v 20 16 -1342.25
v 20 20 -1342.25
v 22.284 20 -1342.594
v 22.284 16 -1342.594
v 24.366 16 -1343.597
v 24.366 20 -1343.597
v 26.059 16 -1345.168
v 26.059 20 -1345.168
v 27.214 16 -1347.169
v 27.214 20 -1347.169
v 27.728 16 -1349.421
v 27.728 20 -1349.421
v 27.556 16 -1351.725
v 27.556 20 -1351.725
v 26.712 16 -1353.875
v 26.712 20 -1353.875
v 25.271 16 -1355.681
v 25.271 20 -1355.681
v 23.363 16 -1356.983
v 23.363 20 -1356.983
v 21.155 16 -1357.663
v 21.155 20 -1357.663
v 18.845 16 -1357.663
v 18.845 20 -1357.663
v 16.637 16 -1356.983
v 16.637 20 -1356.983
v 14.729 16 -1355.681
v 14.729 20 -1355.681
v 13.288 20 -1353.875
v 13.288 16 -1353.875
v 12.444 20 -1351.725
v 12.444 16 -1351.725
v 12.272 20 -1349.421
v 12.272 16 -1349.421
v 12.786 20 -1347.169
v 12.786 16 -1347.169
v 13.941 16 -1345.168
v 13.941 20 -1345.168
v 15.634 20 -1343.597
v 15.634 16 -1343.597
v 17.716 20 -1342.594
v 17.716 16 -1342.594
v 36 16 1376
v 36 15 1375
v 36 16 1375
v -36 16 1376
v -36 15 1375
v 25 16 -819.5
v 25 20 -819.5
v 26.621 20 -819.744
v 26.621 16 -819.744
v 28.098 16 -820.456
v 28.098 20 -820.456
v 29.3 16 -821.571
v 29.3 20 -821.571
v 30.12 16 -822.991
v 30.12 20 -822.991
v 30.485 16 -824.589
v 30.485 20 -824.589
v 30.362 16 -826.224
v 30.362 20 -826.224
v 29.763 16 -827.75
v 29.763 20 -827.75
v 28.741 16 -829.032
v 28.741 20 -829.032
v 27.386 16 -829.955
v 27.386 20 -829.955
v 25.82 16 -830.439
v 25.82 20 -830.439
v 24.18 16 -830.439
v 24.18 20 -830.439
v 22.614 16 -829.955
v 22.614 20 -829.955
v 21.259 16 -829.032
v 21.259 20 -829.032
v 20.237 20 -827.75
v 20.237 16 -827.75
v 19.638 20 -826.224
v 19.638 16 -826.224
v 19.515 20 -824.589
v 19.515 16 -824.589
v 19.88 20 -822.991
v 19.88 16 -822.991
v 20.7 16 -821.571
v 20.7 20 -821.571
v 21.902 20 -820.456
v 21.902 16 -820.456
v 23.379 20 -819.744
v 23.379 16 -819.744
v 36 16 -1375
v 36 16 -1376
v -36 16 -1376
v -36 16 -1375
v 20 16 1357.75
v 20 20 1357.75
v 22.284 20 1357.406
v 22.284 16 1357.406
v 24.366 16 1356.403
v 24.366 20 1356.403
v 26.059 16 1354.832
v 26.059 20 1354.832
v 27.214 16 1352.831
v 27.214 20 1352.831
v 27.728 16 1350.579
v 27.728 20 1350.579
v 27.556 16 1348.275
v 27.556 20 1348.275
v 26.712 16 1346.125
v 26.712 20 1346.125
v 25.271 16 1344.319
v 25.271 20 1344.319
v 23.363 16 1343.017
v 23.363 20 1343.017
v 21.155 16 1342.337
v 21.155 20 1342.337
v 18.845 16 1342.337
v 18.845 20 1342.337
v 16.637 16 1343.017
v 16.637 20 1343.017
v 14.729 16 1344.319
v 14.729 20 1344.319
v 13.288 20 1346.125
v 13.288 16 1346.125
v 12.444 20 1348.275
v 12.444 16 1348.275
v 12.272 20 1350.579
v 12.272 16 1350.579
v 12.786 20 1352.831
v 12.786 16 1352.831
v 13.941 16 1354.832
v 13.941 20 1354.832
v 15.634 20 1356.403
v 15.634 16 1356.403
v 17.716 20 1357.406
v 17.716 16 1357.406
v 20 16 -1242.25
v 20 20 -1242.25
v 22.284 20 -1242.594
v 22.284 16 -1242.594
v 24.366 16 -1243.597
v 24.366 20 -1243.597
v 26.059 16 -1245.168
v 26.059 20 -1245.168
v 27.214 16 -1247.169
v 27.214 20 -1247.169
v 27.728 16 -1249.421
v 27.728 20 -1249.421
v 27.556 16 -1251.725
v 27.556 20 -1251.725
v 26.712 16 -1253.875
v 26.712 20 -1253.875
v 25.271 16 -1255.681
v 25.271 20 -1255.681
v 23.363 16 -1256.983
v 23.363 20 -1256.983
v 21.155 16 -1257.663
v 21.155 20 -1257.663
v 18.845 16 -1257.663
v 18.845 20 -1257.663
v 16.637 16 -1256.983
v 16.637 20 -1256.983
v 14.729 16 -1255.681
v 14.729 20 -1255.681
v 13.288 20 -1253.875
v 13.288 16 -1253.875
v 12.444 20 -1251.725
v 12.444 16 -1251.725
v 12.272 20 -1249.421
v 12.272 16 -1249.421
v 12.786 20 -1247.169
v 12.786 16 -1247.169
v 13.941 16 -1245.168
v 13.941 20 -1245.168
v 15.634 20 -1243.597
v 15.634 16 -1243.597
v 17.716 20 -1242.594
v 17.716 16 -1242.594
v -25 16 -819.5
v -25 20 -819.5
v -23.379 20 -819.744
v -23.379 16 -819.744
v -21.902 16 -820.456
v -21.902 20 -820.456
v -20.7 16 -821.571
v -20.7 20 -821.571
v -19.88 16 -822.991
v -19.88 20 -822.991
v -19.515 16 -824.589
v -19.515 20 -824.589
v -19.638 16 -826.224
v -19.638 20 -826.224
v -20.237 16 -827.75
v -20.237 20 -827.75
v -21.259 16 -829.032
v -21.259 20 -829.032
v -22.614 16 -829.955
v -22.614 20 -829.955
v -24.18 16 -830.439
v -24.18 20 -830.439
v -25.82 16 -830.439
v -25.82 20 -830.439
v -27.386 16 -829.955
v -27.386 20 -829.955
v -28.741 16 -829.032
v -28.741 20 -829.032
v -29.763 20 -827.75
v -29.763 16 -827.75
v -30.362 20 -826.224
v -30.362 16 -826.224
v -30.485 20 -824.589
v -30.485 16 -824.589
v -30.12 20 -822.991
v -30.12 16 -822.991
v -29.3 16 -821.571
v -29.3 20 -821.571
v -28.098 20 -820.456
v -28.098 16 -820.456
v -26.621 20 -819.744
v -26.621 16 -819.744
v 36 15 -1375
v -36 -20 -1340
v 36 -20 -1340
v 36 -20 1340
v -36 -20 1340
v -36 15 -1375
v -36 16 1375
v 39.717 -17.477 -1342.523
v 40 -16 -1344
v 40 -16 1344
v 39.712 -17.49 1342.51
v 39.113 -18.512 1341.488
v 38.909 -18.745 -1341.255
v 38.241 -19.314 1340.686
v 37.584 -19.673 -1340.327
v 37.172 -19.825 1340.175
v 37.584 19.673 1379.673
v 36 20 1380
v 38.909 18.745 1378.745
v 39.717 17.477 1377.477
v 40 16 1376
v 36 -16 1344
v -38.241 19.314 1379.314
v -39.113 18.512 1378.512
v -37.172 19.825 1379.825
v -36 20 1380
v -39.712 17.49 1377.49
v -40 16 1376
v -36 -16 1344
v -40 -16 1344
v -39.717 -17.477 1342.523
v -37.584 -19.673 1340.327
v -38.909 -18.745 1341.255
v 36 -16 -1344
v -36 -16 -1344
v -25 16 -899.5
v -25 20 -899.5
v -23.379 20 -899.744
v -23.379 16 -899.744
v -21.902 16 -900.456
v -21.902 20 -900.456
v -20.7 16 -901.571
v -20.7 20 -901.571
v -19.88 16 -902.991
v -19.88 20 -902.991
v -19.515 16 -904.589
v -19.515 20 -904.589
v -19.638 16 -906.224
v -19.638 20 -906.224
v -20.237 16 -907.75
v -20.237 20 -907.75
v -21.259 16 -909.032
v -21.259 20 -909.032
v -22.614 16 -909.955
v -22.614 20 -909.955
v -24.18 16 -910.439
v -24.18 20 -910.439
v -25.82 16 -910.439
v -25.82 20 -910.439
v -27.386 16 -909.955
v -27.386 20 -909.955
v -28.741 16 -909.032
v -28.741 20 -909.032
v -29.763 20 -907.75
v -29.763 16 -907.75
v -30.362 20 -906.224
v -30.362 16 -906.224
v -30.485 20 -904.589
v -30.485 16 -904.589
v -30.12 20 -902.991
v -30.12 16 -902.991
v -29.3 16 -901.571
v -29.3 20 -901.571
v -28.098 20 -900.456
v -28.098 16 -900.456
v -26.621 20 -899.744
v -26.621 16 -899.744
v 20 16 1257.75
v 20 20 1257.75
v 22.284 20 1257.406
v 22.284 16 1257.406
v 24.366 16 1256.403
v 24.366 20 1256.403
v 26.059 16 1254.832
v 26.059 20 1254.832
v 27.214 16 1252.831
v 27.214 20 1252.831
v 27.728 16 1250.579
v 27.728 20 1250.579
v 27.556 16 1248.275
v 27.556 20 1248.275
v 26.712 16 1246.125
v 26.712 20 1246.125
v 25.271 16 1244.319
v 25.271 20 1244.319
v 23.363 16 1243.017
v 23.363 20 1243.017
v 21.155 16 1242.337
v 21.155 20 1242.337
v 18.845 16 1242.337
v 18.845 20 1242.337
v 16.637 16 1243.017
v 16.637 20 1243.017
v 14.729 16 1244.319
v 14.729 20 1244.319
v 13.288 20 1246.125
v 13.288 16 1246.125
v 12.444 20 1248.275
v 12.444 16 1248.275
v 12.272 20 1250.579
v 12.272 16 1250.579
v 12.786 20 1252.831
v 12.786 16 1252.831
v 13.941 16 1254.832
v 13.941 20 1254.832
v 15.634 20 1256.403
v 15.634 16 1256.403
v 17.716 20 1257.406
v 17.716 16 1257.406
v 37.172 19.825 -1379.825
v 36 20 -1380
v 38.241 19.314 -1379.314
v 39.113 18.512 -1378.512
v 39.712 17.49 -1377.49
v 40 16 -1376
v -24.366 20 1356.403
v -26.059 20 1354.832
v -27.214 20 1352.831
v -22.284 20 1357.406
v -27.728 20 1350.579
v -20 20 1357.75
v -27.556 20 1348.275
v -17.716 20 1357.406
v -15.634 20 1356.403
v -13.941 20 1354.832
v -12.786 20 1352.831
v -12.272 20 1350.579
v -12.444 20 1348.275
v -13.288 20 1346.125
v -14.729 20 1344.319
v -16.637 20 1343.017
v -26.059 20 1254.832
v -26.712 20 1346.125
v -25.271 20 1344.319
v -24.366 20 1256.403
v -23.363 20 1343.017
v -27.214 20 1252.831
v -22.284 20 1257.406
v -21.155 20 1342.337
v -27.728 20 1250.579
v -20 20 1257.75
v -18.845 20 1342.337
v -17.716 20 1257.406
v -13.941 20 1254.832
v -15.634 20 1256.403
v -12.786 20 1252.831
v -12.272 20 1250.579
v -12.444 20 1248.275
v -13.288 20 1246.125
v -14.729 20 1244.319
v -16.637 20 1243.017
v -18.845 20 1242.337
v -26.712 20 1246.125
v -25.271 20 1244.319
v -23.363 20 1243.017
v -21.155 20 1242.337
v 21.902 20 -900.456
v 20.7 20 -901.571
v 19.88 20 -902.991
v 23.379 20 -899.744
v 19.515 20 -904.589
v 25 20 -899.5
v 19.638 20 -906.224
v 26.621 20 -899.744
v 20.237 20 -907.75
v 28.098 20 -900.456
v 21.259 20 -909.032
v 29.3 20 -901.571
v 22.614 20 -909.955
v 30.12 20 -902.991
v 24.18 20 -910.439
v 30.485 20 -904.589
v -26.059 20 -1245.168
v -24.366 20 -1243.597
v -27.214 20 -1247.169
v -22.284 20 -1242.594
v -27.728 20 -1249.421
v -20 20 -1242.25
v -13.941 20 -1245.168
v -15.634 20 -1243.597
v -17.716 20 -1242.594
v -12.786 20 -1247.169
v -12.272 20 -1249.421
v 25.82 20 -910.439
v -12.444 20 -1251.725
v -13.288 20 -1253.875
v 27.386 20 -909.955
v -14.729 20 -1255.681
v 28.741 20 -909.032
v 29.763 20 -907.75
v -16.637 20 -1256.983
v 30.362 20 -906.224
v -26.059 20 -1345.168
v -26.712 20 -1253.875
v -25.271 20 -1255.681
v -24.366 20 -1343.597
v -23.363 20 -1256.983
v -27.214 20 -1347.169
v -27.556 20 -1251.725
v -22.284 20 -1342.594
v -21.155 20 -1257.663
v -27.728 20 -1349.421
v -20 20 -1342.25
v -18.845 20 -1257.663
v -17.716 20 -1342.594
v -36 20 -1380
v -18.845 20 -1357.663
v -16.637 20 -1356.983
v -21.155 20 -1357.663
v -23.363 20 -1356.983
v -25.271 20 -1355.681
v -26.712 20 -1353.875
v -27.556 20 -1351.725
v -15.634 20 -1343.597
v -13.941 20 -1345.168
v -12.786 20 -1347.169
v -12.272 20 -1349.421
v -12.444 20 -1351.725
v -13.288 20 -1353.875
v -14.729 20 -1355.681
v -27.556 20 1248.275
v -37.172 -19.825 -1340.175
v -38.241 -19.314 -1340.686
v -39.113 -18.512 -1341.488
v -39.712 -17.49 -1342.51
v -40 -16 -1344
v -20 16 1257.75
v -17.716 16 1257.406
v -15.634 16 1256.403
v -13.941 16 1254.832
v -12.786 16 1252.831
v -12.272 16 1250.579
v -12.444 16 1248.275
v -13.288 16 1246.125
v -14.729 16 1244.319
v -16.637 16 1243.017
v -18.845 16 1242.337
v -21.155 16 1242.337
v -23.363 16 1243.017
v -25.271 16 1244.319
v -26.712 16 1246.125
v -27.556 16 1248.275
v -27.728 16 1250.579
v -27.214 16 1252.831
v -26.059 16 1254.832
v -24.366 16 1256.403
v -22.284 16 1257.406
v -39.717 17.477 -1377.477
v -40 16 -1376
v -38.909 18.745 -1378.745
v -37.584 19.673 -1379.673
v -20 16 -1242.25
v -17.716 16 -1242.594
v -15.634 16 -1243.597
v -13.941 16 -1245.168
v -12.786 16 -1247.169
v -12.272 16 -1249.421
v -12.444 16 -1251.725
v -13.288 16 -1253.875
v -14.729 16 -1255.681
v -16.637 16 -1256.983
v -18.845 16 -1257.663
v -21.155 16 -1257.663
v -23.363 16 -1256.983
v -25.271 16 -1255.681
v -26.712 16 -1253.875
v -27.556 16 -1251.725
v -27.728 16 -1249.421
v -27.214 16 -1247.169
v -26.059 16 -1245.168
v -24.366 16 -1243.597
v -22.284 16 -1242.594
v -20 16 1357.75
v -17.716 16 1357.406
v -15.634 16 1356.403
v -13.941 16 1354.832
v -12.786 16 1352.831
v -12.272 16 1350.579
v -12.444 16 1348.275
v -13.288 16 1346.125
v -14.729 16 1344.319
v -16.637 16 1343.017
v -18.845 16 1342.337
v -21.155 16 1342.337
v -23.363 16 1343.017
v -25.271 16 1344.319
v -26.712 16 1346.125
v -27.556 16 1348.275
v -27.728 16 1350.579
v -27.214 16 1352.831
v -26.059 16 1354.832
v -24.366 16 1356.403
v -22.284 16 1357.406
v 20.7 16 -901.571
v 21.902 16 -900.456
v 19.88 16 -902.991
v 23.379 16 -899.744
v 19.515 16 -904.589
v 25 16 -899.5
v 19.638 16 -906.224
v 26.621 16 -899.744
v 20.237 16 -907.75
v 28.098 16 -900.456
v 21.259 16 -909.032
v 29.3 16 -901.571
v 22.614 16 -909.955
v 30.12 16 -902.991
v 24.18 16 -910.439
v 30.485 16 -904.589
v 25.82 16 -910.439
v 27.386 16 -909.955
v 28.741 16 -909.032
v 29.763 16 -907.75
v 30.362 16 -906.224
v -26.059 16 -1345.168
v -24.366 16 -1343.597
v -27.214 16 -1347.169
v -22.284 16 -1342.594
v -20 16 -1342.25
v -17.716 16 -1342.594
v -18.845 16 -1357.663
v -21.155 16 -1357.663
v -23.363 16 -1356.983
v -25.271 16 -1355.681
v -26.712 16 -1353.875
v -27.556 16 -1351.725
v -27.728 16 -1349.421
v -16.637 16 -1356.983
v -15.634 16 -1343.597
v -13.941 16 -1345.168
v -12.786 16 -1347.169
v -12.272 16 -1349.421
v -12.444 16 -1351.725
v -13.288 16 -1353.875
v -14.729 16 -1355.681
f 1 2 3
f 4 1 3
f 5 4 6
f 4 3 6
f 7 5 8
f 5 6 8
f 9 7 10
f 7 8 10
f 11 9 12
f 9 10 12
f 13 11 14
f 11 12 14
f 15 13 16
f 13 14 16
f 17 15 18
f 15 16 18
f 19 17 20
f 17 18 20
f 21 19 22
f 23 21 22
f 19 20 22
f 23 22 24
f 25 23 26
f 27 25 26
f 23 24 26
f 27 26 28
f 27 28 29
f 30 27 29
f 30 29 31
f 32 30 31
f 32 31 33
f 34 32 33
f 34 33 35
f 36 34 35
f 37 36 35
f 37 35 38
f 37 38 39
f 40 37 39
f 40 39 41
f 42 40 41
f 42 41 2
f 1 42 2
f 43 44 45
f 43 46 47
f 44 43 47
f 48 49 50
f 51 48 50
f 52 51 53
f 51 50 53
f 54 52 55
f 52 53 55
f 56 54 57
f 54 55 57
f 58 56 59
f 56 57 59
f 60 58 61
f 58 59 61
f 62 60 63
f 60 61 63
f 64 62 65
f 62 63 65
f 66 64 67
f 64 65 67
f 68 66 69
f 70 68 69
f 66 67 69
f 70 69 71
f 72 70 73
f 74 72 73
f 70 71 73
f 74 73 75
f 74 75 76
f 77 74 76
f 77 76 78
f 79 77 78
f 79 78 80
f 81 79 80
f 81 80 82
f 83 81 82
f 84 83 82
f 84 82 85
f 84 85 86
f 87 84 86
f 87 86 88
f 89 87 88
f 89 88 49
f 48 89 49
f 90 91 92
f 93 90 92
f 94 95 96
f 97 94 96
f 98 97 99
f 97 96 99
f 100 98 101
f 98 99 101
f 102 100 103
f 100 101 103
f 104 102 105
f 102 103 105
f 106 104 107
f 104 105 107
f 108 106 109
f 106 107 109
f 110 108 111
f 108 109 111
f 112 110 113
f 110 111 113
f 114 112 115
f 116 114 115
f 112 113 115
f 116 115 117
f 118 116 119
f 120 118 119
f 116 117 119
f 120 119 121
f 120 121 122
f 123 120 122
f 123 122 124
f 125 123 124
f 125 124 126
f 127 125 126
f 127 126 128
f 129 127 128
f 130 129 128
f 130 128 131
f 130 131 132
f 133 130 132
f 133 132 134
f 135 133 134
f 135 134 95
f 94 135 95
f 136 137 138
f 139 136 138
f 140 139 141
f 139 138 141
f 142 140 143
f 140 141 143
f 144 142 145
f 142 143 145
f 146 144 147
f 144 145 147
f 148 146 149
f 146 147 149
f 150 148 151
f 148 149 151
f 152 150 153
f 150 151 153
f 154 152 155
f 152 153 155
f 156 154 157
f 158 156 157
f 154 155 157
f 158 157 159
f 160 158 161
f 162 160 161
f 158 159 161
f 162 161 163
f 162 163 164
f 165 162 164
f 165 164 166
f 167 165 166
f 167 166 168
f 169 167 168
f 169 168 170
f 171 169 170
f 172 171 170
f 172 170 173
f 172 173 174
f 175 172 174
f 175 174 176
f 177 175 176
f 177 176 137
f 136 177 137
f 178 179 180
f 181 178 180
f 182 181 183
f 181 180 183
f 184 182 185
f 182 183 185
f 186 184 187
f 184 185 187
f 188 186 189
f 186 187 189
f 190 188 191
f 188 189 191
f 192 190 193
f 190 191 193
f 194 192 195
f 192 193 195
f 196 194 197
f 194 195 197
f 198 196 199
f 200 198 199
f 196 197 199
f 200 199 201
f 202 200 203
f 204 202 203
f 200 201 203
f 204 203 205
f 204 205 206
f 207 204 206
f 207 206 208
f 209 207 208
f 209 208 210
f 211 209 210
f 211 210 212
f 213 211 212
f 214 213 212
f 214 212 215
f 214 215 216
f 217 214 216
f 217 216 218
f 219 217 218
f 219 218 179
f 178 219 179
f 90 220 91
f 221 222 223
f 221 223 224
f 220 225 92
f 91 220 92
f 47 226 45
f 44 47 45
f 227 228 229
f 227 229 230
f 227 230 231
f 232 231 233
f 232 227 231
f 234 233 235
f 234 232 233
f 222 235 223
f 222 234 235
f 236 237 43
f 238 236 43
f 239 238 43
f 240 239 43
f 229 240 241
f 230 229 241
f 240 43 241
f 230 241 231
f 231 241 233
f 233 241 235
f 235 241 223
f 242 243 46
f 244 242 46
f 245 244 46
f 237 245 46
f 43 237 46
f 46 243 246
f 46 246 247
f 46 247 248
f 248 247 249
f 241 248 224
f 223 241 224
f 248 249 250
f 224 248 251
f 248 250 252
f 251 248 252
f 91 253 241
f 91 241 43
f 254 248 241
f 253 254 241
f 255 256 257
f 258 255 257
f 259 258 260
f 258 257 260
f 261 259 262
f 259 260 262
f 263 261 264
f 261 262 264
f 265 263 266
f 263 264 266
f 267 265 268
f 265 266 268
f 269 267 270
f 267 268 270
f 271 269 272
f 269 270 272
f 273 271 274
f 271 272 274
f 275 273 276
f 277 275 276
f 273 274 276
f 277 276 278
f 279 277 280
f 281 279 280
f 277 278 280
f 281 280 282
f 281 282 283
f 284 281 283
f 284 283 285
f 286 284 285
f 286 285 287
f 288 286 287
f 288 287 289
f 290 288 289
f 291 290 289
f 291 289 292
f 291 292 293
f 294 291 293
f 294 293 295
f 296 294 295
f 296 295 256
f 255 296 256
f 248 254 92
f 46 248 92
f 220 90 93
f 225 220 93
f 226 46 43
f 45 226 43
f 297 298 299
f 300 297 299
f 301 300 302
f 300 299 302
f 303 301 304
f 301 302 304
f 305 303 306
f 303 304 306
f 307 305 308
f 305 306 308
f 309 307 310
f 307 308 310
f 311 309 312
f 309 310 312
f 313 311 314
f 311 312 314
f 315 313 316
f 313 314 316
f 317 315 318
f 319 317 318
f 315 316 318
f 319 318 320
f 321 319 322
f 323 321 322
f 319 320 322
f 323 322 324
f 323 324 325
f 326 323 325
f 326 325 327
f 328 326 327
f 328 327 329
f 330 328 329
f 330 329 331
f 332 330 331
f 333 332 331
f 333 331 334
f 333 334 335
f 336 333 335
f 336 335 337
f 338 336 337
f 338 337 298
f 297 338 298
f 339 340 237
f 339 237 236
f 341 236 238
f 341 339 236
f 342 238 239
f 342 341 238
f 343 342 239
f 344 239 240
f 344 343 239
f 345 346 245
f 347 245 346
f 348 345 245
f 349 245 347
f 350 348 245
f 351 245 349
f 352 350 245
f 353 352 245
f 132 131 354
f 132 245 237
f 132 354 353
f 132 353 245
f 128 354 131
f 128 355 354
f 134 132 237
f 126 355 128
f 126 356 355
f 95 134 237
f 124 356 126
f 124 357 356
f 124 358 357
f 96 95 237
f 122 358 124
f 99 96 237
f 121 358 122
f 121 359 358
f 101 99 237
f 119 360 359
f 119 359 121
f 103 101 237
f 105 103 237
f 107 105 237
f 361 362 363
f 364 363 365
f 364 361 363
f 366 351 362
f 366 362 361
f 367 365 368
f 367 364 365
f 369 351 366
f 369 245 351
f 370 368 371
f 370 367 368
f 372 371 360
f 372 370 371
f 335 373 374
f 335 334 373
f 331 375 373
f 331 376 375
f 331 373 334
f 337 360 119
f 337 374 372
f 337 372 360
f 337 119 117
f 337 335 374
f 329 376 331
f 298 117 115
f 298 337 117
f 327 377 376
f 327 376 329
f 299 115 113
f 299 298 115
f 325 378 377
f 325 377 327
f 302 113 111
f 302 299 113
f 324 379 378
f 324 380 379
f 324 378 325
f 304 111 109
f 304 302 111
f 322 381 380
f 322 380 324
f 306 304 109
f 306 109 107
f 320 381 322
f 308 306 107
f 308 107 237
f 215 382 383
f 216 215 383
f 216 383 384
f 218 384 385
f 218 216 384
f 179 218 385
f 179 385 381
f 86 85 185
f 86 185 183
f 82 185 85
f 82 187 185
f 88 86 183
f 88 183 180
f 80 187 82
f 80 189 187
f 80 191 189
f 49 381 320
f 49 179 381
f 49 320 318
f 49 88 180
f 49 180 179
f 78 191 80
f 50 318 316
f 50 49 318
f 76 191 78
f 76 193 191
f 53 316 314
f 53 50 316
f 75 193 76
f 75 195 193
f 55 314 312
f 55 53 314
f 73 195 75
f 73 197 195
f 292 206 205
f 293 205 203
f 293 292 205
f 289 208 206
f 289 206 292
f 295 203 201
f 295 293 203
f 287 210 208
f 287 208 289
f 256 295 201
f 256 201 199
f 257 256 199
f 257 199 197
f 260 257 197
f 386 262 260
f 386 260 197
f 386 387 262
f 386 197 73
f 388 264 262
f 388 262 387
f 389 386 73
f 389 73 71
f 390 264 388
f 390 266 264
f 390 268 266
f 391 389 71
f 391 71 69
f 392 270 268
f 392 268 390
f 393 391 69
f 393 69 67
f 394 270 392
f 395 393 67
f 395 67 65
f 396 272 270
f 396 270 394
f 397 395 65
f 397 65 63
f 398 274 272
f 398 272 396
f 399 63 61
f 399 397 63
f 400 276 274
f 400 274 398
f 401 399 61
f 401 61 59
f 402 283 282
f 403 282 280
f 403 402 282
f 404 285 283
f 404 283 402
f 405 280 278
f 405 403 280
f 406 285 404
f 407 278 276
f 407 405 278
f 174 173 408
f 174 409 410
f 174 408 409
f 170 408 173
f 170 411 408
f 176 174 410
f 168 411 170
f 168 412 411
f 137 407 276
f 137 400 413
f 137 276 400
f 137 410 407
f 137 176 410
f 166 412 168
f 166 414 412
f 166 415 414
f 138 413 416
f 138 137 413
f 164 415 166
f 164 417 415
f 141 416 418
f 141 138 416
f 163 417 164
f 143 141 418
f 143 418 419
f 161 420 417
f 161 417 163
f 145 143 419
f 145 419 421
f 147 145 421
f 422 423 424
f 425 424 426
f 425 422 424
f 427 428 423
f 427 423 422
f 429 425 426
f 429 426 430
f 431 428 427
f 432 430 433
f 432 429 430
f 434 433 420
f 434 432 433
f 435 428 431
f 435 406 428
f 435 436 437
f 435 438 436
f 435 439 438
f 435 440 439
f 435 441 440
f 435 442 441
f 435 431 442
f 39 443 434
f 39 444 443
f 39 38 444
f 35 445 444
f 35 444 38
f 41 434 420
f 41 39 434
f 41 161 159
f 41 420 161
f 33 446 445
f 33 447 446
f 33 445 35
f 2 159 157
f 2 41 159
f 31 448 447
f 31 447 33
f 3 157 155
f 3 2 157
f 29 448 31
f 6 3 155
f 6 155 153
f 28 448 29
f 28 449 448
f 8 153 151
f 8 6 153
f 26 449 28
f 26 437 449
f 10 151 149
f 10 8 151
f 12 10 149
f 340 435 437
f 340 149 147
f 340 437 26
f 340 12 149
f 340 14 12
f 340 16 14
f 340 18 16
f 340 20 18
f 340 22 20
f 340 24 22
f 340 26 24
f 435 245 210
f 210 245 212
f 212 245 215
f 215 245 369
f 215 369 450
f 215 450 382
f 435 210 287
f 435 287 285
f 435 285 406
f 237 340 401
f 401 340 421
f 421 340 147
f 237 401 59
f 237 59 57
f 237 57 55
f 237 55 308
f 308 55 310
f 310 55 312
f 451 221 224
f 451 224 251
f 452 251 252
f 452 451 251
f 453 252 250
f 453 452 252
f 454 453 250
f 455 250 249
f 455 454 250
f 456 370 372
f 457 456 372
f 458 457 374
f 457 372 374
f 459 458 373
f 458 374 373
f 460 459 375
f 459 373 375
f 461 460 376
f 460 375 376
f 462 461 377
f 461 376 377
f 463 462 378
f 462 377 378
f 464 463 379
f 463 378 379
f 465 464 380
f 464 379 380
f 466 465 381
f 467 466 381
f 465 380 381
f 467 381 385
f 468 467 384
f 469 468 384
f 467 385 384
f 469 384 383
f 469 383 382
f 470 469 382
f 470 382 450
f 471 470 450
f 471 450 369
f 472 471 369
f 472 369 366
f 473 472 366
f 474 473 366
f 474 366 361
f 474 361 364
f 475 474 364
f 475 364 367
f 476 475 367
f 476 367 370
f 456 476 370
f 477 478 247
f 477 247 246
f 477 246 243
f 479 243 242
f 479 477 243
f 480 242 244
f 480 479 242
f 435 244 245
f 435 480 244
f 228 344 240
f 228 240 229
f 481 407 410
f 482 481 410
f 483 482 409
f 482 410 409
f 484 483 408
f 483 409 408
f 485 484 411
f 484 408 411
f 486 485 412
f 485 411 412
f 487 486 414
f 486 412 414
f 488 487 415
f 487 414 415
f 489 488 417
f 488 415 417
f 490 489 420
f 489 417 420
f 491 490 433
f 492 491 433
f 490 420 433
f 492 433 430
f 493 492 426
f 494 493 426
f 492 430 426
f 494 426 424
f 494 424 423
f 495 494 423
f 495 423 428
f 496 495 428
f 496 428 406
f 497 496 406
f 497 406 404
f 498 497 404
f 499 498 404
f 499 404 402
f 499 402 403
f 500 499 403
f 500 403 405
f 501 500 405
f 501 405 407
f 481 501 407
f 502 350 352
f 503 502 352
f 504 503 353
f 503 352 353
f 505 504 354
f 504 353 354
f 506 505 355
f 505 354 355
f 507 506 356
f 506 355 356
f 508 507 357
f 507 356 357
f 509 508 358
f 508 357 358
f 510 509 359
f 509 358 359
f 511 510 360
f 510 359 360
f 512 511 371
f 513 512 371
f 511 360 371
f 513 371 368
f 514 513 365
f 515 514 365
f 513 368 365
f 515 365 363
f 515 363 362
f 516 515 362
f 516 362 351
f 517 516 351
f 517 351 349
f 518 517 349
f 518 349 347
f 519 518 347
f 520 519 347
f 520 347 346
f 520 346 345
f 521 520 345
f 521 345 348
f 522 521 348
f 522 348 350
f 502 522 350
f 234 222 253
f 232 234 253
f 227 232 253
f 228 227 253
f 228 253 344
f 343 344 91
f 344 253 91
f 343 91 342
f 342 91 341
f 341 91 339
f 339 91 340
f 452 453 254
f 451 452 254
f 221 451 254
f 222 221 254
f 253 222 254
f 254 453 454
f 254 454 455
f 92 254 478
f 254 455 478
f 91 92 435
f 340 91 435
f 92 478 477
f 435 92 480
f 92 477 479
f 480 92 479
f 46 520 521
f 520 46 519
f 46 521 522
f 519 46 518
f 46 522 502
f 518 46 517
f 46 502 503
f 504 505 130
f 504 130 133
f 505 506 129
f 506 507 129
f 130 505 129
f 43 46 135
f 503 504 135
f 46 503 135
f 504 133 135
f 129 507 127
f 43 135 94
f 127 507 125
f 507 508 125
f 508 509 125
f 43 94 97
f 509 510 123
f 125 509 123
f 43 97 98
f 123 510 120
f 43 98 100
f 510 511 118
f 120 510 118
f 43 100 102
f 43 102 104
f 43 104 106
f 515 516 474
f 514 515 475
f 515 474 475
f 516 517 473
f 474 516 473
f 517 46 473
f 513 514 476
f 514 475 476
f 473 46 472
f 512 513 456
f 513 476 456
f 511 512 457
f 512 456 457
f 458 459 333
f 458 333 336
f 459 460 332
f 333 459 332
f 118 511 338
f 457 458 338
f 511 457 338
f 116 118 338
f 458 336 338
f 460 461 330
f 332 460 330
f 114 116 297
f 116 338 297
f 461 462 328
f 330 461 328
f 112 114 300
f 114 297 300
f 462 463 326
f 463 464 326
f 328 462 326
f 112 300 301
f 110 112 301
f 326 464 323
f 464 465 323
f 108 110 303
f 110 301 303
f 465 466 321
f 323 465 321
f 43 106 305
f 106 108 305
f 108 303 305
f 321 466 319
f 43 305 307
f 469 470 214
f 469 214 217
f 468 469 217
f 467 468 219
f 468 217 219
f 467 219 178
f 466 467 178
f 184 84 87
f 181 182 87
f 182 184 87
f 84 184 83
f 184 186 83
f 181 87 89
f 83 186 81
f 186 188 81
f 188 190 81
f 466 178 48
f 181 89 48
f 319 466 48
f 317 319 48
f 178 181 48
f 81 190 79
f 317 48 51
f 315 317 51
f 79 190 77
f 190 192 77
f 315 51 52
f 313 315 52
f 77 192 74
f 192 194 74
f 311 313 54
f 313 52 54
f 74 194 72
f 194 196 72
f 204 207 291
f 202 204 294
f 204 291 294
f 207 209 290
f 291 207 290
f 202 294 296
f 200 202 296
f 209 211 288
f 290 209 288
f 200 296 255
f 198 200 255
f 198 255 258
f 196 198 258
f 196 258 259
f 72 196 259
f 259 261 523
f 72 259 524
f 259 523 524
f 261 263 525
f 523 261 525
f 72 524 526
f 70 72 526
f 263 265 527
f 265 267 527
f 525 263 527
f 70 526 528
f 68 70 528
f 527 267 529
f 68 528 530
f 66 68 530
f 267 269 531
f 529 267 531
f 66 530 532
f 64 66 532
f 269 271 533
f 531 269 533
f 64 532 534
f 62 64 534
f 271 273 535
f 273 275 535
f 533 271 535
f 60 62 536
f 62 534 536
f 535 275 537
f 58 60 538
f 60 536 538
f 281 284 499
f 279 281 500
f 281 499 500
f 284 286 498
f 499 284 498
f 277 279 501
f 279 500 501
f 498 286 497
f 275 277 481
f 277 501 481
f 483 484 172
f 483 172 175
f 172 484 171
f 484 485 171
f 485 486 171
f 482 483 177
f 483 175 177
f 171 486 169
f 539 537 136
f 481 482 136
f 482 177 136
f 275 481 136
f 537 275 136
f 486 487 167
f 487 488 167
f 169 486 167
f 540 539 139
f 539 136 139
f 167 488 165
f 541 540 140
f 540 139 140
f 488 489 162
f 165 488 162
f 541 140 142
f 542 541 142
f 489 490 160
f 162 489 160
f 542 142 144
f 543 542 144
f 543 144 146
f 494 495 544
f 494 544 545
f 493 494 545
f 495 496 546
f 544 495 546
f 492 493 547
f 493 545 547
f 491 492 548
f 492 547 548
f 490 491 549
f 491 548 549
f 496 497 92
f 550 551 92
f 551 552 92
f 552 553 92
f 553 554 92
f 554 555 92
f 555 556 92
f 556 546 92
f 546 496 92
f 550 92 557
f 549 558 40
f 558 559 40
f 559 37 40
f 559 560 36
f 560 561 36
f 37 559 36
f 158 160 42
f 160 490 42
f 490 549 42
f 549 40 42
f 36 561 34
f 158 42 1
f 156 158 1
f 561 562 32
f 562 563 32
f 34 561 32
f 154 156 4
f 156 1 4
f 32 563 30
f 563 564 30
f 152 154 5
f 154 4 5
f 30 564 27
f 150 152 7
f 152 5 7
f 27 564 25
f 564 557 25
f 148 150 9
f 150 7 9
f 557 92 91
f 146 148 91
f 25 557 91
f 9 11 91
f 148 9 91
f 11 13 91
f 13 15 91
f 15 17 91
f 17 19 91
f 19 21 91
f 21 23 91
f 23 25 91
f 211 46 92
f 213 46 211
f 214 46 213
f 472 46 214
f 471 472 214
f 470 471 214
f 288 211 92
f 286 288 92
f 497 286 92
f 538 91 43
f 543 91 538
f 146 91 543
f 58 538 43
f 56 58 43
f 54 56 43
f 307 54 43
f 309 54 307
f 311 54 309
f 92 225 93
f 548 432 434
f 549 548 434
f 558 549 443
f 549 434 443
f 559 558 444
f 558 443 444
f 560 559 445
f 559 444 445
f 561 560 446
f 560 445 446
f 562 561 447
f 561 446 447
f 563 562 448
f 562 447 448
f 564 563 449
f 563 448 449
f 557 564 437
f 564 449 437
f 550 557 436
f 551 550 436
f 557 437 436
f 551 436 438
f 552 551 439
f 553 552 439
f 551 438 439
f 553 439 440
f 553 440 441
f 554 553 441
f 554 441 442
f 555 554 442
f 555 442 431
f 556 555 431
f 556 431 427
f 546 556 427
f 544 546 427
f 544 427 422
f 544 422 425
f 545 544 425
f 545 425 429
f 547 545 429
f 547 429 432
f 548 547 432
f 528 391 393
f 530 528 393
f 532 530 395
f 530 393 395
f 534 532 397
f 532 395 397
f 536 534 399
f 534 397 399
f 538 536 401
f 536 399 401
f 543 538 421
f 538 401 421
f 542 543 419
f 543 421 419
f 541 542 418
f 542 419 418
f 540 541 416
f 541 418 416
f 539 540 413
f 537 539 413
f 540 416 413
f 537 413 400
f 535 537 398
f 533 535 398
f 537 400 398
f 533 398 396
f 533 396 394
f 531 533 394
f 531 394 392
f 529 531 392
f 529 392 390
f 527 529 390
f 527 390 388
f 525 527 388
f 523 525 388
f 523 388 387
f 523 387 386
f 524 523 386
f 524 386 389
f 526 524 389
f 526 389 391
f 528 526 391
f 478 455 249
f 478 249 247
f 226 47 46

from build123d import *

# Parameters (mm, degrees)
Y_KSEKLIK_EKSTR_ZYON1_DEPTH      = 1380
Y_KSEKLIK_EKSTR_ZYON1_DEPTH_BACK = 1380
IZIM1_W                          = 72
IZIM1_H                          = 32
IZIM2_R                          = 7.75
KES_EKSTR_ZYON1_DEPTH            = 10
IZIM3_R                          = 5.5
KES_EKSTR_ZYON2_DEPTH            = 20
IZIM4_W                          = 72
IZIM4_H                          = 32
Y_KSEKLIK_EKSTR_ZYON2_DEPTH      = 5
IZIM5_W                          = 72
IZIM5_H                          = 32
Y_KSEKLIK_EKSTR_ZYON3_DEPTH      = 5
KES_EKSTR_ZYON3_DEPTH            = 220
KES_EKSTR_ZYON3_DEPTH_BACK       = 290


with BuildPart() as part:
    # Çizim1 → Yükseklik-Ekstrüzyon1 (new, two sides: drawn at the far end of the back side and taken through both)
    with BuildSketch(Plane.XY.offset(-Y_KSEKLIK_EKSTR_ZYON1_DEPTH_BACK)):
        with BuildLine():
            Line((-36, 20), (36, 20))
            ThreePointArc((36, 20), (38.828427125, 18.828427125), (40, 16))
            Line((40, 16), (40, -16))
            ThreePointArc((40, -16), (38.828427125, -18.828427125), (36, -20))
            Line((36, -20), (-36, -20))
            ThreePointArc((-36, -20), (-38.828427125, -18.828427125), (-40, -16))
            Line((-40, -16), (-40, 16))
            ThreePointArc((-40, 16), (-38.828427125, 18.828427125), (-36, 20))
        make_face()
        Rectangle(IZIM1_W, IZIM1_H, mode=Mode.SUBTRACT)
    extrude(amount=Y_KSEKLIK_EKSTR_ZYON1_DEPTH + Y_KSEKLIK_EKSTR_ZYON1_DEPTH_BACK)

    # Çizim2 → Kes-Ekstrüzyon1 (cut)
    with BuildSketch(Plane(origin=(0, 20, 0), x_dir=(1, 0, 0), z_dir=(0, 1, 0))):
        with Locations(Location((-20, 1350, 0), (0, 0, 270))):
            Circle(IZIM2_R)
        with Locations(Location((20, 1350, 0), (0, 0, 270))):
            Circle(IZIM2_R)
        with Locations(Location((20, 1250, 0), (0, 0, 270))):
            Circle(IZIM2_R)
        with Locations(Location((-20, 1250, 0), (0, 0, 270))):
            Circle(IZIM2_R)
        with Locations(Location((-20, -1250, 0), (0, 0, 270))):
            Circle(IZIM2_R)
        with Locations(Location((20, -1250, 0), (0, 0, 270))):
            Circle(IZIM2_R)
        with Locations(Location((20, -1350, 0), (0, 0, 270))):
            Circle(IZIM2_R)
        with Locations(Location((-20, -1350, 0), (0, 0, 270))):
            Circle(IZIM2_R)
    extrude(amount=-KES_EKSTR_ZYON1_DEPTH, mode=Mode.SUBTRACT)

    # Çizim3 → Kes-Ekstrüzyon2 (cut)
    with BuildSketch(Plane(origin=(0, 20, 0), x_dir=(1, 0, 0), z_dir=(0, 1, 0))):
        with Locations(Location((25, 905, 0), (0, 0, 270))):
            Circle(IZIM3_R)
        with Locations(Location((-25, 905, 0), (0, 0, 270))):
            Circle(IZIM3_R)
        with Locations(Location((25, 825, 0), (0, 0, 270))):
            Circle(IZIM3_R)
        with Locations(Location((-25, 825, 0), (0, 0, 270))):
            Circle(IZIM3_R)
    extrude(amount=-KES_EKSTR_ZYON2_DEPTH, mode=Mode.SUBTRACT)


with BuildPart() as body_2:
    # Çizim4 → Yükseklik-Ekstrüzyon2 (new body)
    with BuildSketch(Plane(origin=(0, 0, -1380), x_dir=(-1, 0, 0), z_dir=(0, 0, -1))):
        Rectangle(IZIM4_W, IZIM4_H)
    extrude(amount=-Y_KSEKLIK_EKSTR_ZYON2_DEPTH)


with BuildPart() as body_3:
    # Çizim5 → Yükseklik-Ekstrüzyon3 (new body)
    with BuildSketch(Plane.XY.offset(1380)):
        Rectangle(IZIM5_W, IZIM5_H)
    extrude(amount=-Y_KSEKLIK_EKSTR_ZYON3_DEPTH)


with BuildPart() as kes_ekstr_zyon3_tool:
    # Çizim6 → Kes-Ekstrüzyon3 (new, two sides: drawn at the far end of the back side and taken through both)
    with BuildSketch(Plane(origin=(0, 0, 0), x_dir=(0, 0, -1), z_dir=(1, 0, 0)).offset(-KES_EKSTR_ZYON3_DEPTH_BACK)):
        Polygon((-1380, -20), (-1380, 20), (-1340, -20), align=None)
        Polygon((1380, -20), (1340, -20), (1380, 20), align=None)
    extrude(amount=KES_EKSTR_ZYON3_DEPTH + KES_EKSTR_ZYON3_DEPTH_BACK)


with BuildPart() as part_1:
    add(part.part)

    # Kes-Ekstrüzyon3: cut by kes_ekstr_zyon3_tool
    add(kes_ekstr_zyon3_tool.part, mode=Mode.SUBTRACT)


with BuildPart() as body_2_1:
    add(body_2.part)

    # Kes-Ekstrüzyon3: cut by kes_ekstr_zyon3_tool
    add(kes_ekstr_zyon3_tool.part, mode=Mode.SUBTRACT)


with BuildPart() as body_3_1:
    add(body_3.part)

    # Kes-Ekstrüzyon3: cut by kes_ekstr_zyon3_tool
    add(kes_ekstr_zyon3_tool.part, mode=Mode.SUBTRACT)


solid = Compound([part_1.part, body_2_1.part, body_3_1.part])
